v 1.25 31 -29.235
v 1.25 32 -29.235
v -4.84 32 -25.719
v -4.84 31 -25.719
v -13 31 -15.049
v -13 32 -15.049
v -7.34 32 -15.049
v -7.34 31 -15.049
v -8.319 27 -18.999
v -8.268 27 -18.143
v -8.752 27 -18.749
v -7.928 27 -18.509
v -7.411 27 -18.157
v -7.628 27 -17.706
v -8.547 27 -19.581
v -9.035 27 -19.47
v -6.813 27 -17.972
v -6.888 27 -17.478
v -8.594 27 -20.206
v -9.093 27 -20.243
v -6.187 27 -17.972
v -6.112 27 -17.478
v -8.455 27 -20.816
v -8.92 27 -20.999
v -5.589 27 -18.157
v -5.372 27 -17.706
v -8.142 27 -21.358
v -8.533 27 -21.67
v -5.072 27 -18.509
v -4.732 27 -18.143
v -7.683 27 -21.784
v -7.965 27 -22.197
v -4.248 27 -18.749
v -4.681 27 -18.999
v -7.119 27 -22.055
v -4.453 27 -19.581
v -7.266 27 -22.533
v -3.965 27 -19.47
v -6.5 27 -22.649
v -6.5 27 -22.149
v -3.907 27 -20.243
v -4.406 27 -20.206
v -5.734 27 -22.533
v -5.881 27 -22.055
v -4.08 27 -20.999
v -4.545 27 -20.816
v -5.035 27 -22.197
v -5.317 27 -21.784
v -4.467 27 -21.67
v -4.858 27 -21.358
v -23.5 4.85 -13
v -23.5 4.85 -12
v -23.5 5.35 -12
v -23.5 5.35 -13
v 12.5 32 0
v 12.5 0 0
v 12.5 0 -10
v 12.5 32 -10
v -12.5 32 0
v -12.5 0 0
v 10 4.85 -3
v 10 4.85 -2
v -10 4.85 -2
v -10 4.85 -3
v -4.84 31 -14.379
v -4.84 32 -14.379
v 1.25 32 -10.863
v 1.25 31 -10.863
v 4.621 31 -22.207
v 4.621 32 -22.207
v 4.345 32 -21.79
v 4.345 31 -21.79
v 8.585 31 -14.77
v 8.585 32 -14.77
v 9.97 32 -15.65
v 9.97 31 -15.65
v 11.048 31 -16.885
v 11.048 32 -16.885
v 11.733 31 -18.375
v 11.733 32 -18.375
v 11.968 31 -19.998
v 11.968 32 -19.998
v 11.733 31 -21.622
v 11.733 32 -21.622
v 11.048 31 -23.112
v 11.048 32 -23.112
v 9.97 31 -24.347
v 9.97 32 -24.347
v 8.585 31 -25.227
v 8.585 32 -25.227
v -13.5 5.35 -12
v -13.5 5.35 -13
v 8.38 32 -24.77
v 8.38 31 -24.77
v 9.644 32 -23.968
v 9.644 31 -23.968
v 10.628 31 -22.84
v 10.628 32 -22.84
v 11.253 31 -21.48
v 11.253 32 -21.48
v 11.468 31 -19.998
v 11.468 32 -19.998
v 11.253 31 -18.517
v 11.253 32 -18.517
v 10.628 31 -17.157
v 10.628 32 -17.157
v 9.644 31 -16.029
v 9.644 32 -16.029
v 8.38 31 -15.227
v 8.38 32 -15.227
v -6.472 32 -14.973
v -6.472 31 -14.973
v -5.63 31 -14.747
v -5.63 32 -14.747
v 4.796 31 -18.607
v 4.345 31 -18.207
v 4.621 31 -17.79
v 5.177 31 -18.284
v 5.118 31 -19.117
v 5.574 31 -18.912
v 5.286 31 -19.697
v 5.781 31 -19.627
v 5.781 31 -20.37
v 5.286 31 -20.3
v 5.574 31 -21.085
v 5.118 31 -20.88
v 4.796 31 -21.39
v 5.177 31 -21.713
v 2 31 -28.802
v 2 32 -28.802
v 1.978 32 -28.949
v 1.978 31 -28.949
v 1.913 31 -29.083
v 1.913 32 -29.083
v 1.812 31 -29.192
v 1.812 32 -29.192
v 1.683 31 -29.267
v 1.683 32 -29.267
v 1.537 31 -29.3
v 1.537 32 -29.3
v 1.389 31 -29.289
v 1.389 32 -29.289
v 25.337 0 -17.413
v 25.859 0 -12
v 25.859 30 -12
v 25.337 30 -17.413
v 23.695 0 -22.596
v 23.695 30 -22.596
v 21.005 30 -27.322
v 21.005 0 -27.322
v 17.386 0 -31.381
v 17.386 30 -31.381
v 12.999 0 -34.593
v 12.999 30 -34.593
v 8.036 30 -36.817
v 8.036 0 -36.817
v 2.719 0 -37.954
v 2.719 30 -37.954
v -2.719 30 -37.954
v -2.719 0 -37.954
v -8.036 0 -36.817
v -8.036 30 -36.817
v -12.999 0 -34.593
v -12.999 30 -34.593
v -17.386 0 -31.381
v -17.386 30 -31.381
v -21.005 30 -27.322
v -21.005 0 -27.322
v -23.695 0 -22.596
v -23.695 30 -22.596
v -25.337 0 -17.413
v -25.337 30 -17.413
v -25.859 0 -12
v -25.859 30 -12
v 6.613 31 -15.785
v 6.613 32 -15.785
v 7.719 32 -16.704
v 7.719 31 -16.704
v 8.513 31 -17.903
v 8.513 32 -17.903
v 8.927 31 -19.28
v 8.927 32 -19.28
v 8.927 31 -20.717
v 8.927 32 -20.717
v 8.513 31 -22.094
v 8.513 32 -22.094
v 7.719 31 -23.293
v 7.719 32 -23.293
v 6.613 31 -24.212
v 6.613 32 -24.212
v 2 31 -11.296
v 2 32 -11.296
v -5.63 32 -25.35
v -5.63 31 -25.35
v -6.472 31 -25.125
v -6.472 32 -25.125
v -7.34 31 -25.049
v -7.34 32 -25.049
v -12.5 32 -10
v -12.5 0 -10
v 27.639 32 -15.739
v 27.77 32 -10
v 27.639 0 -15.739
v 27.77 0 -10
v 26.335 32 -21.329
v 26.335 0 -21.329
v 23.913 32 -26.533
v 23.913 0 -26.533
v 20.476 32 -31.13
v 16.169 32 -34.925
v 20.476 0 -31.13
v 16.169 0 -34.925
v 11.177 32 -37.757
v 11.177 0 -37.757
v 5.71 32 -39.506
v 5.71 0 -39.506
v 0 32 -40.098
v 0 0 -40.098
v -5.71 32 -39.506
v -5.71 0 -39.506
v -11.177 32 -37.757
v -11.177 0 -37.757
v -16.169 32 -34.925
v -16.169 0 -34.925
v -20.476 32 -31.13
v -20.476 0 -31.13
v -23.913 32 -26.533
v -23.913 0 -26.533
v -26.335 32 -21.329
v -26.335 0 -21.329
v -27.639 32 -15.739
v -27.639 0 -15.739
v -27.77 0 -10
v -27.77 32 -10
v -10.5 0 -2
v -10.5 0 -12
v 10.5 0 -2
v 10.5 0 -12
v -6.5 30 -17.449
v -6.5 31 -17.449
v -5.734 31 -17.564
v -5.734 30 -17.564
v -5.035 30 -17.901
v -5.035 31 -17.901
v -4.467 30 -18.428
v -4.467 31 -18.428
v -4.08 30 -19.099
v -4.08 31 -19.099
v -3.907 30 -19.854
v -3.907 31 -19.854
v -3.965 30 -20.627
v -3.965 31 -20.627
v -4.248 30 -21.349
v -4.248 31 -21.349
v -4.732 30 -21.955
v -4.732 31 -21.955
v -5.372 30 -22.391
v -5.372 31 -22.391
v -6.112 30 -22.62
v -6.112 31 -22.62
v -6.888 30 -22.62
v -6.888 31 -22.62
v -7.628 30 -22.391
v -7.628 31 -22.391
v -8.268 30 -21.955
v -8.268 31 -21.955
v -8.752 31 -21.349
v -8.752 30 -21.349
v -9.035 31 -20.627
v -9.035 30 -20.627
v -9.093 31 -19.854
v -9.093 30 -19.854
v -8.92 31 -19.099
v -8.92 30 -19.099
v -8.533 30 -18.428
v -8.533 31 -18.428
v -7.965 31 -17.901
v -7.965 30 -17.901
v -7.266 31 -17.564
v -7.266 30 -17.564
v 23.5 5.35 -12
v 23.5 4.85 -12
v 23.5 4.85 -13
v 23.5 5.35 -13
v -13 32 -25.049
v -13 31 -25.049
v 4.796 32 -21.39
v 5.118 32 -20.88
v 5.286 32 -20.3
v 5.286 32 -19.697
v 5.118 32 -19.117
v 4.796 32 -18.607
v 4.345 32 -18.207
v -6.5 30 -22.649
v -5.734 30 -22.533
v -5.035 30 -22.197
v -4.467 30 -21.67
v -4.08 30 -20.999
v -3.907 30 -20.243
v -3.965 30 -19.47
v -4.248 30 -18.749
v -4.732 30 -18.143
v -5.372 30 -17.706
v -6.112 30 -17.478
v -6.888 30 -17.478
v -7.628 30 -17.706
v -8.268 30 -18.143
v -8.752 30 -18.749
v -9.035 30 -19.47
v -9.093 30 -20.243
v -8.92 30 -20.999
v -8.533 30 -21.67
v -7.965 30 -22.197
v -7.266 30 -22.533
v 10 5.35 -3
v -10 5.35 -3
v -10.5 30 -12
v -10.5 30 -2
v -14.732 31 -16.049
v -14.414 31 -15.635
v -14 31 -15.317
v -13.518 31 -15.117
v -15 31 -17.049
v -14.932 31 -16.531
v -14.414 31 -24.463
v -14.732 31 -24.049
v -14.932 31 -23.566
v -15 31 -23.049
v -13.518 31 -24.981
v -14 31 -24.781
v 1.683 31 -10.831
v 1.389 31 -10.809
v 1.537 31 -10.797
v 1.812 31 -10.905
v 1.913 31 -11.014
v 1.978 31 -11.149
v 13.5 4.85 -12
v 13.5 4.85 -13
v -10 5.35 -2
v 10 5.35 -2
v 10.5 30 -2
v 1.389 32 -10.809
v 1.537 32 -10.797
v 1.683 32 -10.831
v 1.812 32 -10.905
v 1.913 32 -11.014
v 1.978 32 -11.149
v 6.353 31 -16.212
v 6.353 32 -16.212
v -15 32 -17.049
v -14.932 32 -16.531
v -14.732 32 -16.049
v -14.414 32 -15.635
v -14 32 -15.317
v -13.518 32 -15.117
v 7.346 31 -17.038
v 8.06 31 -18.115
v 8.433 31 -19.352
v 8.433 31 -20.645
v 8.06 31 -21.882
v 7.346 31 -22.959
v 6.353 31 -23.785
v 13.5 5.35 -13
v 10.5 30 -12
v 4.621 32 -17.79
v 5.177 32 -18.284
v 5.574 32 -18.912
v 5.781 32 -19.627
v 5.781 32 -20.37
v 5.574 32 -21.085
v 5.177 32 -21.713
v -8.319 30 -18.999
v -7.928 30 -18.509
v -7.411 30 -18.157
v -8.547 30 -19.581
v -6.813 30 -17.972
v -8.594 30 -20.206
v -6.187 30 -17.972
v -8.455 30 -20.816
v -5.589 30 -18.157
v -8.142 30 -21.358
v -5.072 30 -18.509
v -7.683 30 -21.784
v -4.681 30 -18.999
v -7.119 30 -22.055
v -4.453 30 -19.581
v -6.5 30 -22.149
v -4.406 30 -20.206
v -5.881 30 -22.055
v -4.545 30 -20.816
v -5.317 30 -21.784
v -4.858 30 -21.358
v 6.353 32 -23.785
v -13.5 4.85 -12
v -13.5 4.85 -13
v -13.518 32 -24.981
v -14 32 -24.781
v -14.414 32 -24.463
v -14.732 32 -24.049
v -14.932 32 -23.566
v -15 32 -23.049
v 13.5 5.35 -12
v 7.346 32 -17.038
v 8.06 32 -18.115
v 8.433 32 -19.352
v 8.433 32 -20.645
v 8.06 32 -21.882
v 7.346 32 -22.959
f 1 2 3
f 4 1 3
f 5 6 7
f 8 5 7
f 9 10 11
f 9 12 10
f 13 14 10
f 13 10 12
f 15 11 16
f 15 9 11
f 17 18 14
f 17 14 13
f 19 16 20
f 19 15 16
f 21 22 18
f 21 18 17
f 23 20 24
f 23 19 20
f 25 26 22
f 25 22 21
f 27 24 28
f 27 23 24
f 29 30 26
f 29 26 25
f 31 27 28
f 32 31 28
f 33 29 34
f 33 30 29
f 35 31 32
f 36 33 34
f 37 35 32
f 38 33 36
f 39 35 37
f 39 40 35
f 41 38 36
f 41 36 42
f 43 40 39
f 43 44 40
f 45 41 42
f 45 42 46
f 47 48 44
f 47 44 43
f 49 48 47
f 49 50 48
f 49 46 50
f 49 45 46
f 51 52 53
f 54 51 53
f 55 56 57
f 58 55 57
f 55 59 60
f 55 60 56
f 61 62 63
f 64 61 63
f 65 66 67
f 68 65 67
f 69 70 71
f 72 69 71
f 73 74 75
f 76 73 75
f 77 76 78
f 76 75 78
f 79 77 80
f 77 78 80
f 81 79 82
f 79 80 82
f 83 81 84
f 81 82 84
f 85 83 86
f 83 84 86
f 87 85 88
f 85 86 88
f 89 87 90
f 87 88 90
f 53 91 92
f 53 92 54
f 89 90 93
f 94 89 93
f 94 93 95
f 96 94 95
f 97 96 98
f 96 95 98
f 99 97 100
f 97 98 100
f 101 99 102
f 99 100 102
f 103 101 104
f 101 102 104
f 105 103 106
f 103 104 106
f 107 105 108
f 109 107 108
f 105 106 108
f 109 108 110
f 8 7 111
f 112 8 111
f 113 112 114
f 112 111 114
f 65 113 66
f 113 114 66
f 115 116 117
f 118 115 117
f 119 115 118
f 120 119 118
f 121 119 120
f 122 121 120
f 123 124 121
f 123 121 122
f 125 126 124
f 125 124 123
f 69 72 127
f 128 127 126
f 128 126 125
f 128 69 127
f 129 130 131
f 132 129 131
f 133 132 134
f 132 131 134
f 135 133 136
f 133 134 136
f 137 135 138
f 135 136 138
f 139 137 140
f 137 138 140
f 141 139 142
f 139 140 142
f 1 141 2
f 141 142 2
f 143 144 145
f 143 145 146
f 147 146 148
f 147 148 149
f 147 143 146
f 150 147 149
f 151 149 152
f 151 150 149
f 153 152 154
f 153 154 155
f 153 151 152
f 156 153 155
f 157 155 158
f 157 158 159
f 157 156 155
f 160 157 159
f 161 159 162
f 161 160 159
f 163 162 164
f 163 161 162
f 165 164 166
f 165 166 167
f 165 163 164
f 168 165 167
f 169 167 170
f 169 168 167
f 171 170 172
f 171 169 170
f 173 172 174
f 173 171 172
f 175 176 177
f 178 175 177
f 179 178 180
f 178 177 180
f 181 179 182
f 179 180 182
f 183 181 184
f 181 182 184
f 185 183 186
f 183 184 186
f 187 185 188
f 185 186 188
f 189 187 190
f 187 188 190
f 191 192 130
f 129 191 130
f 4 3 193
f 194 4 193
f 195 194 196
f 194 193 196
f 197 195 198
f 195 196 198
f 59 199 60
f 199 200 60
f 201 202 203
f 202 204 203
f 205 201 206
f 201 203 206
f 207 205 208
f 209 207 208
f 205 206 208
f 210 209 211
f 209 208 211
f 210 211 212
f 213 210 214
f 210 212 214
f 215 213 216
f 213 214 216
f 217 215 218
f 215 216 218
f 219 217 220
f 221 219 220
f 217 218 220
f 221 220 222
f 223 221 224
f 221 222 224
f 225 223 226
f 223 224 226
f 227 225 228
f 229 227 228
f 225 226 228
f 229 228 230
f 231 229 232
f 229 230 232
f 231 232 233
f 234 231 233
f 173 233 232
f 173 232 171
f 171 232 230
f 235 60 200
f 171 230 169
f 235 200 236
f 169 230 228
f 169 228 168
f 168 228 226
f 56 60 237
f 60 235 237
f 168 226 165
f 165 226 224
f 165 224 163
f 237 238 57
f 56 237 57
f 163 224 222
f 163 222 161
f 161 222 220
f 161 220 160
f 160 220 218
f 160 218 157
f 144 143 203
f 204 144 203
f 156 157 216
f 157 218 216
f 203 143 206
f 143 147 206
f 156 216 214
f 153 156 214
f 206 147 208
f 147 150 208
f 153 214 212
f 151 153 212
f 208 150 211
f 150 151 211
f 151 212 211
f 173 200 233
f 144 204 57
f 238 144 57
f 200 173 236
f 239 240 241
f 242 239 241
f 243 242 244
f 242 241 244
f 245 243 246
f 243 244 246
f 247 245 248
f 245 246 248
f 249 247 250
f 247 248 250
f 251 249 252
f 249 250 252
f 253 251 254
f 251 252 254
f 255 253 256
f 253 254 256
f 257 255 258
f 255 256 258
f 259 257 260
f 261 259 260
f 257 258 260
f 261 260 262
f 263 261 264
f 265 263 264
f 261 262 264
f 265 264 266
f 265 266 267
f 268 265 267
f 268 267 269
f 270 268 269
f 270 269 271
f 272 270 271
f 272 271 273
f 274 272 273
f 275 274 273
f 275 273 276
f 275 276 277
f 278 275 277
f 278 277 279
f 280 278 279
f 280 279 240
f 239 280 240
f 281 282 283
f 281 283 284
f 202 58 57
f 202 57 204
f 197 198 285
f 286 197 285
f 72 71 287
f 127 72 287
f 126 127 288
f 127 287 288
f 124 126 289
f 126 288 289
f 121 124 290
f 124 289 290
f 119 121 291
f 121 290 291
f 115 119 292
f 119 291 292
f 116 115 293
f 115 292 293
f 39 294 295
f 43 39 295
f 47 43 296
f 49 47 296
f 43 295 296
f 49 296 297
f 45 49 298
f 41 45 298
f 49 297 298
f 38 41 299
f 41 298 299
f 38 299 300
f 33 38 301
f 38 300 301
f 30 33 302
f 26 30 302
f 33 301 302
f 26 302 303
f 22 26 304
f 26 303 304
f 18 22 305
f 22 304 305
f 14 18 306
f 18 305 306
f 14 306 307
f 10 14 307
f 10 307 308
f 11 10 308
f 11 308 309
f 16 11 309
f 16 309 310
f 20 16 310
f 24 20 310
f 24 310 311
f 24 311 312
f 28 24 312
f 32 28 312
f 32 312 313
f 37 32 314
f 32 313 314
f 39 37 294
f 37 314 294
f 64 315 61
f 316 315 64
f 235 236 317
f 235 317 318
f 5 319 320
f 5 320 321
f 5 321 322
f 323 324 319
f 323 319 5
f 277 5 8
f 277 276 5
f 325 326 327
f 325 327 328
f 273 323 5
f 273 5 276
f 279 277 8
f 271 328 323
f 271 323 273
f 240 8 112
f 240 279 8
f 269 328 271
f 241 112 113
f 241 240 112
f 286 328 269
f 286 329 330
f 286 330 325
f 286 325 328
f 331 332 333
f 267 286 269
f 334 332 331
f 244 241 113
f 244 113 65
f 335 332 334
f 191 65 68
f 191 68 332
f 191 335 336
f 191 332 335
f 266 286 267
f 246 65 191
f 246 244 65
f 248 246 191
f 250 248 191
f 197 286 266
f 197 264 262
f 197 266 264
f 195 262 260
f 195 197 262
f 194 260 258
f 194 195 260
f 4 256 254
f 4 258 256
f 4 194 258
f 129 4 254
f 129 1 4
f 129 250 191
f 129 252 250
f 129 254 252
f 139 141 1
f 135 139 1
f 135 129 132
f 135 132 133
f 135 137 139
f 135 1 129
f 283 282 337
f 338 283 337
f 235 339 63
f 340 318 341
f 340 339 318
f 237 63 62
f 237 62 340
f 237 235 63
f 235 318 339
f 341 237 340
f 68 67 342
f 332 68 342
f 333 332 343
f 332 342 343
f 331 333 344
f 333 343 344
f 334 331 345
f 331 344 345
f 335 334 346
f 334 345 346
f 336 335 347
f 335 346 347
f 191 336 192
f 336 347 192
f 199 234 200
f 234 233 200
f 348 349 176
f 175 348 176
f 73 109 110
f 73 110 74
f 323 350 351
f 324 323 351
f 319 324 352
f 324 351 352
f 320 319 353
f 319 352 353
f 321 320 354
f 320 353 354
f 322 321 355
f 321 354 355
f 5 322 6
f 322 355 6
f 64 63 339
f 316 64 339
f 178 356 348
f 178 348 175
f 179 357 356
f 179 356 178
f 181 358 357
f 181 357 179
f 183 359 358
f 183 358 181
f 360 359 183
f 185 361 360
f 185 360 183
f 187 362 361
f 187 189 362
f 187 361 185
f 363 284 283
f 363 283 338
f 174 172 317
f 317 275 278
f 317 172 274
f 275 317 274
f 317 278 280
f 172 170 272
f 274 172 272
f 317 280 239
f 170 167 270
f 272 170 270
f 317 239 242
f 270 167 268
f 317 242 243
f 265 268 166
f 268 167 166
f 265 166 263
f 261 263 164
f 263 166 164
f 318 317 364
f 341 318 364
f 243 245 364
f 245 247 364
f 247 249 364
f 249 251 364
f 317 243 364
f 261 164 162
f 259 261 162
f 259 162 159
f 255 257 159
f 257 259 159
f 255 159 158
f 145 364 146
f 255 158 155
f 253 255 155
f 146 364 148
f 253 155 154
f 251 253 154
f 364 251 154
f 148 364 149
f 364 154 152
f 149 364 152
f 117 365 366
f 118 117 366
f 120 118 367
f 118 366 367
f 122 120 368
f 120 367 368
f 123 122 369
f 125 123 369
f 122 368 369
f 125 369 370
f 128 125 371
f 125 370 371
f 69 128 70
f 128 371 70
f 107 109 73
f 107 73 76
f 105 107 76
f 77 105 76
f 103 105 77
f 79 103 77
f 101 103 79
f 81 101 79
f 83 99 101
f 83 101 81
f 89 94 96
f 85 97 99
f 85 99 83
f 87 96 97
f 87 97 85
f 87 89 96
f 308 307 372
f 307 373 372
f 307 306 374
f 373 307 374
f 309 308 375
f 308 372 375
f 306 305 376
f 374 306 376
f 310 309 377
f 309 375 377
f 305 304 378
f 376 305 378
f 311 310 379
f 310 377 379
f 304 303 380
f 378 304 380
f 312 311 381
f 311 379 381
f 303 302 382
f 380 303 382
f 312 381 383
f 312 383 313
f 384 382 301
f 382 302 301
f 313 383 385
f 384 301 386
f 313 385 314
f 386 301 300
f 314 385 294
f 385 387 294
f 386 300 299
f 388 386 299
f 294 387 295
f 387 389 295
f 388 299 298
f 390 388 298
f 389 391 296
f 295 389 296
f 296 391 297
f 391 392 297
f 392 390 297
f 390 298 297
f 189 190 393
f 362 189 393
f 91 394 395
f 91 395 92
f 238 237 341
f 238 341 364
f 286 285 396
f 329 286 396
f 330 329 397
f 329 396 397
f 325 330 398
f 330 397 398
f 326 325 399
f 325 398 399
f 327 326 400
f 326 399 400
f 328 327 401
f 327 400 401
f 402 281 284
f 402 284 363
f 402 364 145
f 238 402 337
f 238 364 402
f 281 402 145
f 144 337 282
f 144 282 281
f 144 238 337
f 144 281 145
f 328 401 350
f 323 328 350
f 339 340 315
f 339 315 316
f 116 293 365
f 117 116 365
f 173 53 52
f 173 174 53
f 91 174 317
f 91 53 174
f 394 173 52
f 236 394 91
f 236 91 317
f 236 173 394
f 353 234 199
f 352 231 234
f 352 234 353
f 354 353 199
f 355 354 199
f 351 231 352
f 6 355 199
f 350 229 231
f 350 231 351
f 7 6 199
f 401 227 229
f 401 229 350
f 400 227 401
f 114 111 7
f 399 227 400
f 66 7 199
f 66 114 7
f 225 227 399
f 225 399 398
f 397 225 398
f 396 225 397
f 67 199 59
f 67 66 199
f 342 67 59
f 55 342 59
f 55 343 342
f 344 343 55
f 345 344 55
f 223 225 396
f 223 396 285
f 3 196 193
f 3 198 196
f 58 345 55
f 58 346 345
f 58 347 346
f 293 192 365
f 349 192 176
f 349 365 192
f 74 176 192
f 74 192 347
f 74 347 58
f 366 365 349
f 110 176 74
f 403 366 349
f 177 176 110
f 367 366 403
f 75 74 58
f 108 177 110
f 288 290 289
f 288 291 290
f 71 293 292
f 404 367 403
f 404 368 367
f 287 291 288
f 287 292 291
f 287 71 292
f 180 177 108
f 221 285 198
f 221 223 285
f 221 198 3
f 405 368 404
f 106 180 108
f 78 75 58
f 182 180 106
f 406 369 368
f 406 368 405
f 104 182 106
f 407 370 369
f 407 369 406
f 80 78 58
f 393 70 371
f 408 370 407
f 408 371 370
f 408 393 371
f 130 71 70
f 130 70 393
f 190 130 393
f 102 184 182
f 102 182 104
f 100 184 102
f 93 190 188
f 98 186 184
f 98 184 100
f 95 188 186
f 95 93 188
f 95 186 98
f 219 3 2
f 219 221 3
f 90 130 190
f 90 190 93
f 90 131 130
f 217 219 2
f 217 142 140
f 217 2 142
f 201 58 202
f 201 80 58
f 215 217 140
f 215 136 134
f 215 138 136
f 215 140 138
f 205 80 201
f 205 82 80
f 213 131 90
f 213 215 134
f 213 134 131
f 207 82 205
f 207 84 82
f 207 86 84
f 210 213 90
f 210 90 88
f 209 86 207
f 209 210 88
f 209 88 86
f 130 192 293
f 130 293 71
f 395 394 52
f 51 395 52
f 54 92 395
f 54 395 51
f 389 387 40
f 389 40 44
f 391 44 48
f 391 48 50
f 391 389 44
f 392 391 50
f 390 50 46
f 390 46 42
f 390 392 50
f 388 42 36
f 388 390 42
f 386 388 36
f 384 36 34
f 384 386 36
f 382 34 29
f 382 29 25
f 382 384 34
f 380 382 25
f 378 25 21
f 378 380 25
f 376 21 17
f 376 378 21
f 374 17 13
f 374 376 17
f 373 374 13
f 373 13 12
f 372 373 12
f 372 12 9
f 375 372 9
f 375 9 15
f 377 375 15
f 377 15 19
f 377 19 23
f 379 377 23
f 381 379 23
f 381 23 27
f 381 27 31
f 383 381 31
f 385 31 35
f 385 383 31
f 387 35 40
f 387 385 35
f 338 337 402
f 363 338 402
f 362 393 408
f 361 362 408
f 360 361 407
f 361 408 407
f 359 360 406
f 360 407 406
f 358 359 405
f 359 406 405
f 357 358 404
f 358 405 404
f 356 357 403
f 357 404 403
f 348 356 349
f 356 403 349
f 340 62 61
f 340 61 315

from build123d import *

# Parameters (mm, degrees)
EXTRUIR_L_MINA1_DEPTH        = 30
SALIENTE_EXTRUIR1_DEPTH      = 2
CORTAR_EXTRUIR1_DEPTH        = 1
CORTAR_EXTRUIR_L_MINA2_DEPTH = 1
CROQUIS5_W                   = 20
CROQUIS5_H                   = 0.5
EXTRUIR_L_MINA2_DEPTH        = 1
CROQUIS6_W                   = 10
CROQUIS6_H                   = 0.5
EXTRUIR_L_MINA3_DEPTH        = 1
CROQUIS7_R                   = 2.6
CORTAR_EXTRUIR2_DEPTH        = 11
CROQUIS8_R                   = 2.6
CROQUIS8_R_2                 = 2.1
SALIENTE_EXTRUIR2_DEPTH      = 3


with BuildPart() as part:
    # Croquis1 → Extruir-Lámina1 (new body)
    with BuildSketch(Plane(origin=(0, 0, 0), x_dir=(1, 0, 0), z_dir=(0, 1, 0))):
        with BuildLine():
            Line((-27.77, 10), (-12.5, 10))
            Line((-12.5, 10), (-12.5, 0))
            Line((-12.5, 0), (12.5, 0))
            Line((12.5, 0), (12.5, 10))
            Line((12.5, 10), (27.77, 10))
            ThreePointArc((27.77, 10), (0, 40.097565641), (-27.77, 10))
        make_face()
        with BuildLine():
            Line((-25.858908766, 12), (-10.5, 12))
            Line((-10.5, 12), (-10.5, 2))
            Line((-10.5, 2), (10.5, 2))
            Line((10.5, 2), (10.5, 12))
            Line((10.5, 12), (25.858908766, 12))
            ThreePointArc((25.858908766, 12), (0, 38.097565641), (-25.858908766, 12))
        make_face(mode=Mode.SUBTRACT)
    extrude(amount=EXTRUIR_L_MINA1_DEPTH)

    # Croquis2 → Saliente-Extruir1 (add)
    with BuildSketch(Plane(origin=(0, 30, 0), x_dir=(1, 0, 0), z_dir=(0, 1, 0))):
        with BuildLine():
            Line((12.5, 10), (27.77, 10))
            ThreePointArc((27.77, 10), (0, 40.097565641), (-27.77, 10))
            Line((-27.77, 10), (-12.5, 10))
            Line((-12.5, 10), (-12.5, 0))
            Line((-12.5, 0), (12.5, 0))
            Line((12.5, 0), (12.5, 10))
        make_face()
    extrude(amount=SALIENTE_EXTRUIR1_DEPTH)

    # Croquis3 → Cortar-Extruir1 (cut)
    with BuildSketch(Plane(origin=(0, 32, 0), x_dir=(1, 0, 0), z_dir=(0, 1, 0))):
        with BuildLine():
            Line((-15, 23.048782821), (-15, 17.048782821))
            ThreePointArc((-15, 17.048782821), (-14.414213562, 15.634569258), (-13, 15.048782821))
            Line((-13, 15.048782821), (-7.339745962, 15.048782821))
            ThreePointArc((-7.339745962, 15.048782821), (-6.045650737, 14.878411952), (-4.839745962, 14.37890984))
            Line((-4.839745962, 14.37890984), (1.25, 10.862993369))
            ThreePointArc((1.25, 10.862993369), (1.75, 10.862993369), (2, 11.296006071))
            Line((2, 11.296006071), (2, 28.80155957))
            ThreePointArc((2, 28.80155957), (1.75, 29.234572272), (1.25, 29.234572272))
            Line((1.25, 29.234572272), (-4.839745962, 25.718655802))
            ThreePointArc((-4.839745962, 25.718655802), (-6.045650737, 25.219153689), (-7.339745962, 25.048782821))
            Line((-7.339745962, 25.048782821), (-13, 25.048782821))
            ThreePointArc((-13, 25.048782821), (-14.414213562, 24.462996383), (-15, 23.048782821))
        make_face()
    extrude(amount=-CORTAR_EXTRUIR1_DEPTH, mode=Mode.SUBTRACT)

    # Croquis4 → Cortar-Extruir-Lámina2 (cut)
    with BuildSketch(Plane(origin=(0, 32, 0), x_dir=(1, 0, 0), z_dir=(0, 1, 0))):
        with BuildLine():
            ThreePointArc((4.344585076, 21.79004299), (5.307052977, 19.99849463), (4.344585076, 18.206946269))
            Line((4.344585076, 18.206946269), (4.620613436, 17.79004299))
            ThreePointArc((4.620613436, 17.79004299), (5.807052977, 19.99849463), (4.620613436, 22.206946269))
            Line((4.620613436, 22.206946269), (4.344585076, 21.79004299))
        make_face()
        with BuildLine():
            ThreePointArc((6.352562942, 23.784975176), (8.479957679, 19.99849463), (6.352562942, 16.212014083))
            Line((6.352562942, 16.212014083), (6.612635571, 15.784975176))
            ThreePointArc((6.612635571, 15.784975176), (8.979957679, 19.99849463), (6.612635571, 24.212014083))
            Line((6.612635571, 24.212014083), (6.352562942, 23.784975176))
        make_face()
        with BuildLine():
            ThreePointArc((8.380144543, 24.770452897), (11.467649375, 19.99849463), (8.380144543, 15.226536362))
            Line((8.380144543, 15.226536362), (8.58505397, 14.770452897))
            ThreePointArc((8.58505397, 14.770452897), (11.967649375, 19.99849463), (8.58505397, 25.226536362))
            Line((8.58505397, 25.226536362), (8.380144543, 24.770452897))
        make_face()
    extrude(amount=-CORTAR_EXTRUIR_L_MINA2_DEPTH, mode=Mode.SUBTRACT)

    # Croquis5 → Extruir-Lámina2 (add)
    with BuildSketch(Plane(origin=(0, 0, -2), x_dir=(-1, 0, 0), z_dir=(0, 0, -1))):
        with Locations((0, 5.1)):
            Rectangle(CROQUIS5_W, CROQUIS5_H)
    extrude(amount=EXTRUIR_L_MINA2_DEPTH)

    # Croquis6 → Extruir-Lámina3 (add)
    with BuildSketch(Plane(origin=(0, 0, -12), x_dir=(-1, 0, 0), z_dir=(0, 0, -1))):
        with Locations((-18.5, 5.1)):
            Rectangle(CROQUIS6_W, CROQUIS6_H)
        with Locations((18.5, 5.1)):
            Rectangle(CROQUIS6_W, CROQUIS6_H)
    extrude(amount=EXTRUIR_L_MINA3_DEPTH)

    # Croquis7 → Cortar-Extruir2 (cut)
    with BuildSketch(Plane(origin=(0, 32, 0), x_dir=(1, 0, 0), z_dir=(0, 1, 0))):
        with Locations(Location((-6.5, 20.048782821, 0), (0, 0, 270))):
            Circle(CROQUIS7_R)
    extrude(amount=-CORTAR_EXTRUIR2_DEPTH, mode=Mode.SUBTRACT)


with BuildPart() as body_2:
    # Croquis8 → Saliente-Extruir2 (new body)
    with BuildSketch(Plane.XZ.offset(-30)):
        with Locations(Location((-6.5, -20.048782821, 0), (0, 0, 270))):
            Circle(CROQUIS8_R)
        with Locations(Location((-6.5, -20.048782821, 0), (0, 0, 270))):
            Circle(CROQUIS8_R_2, mode=Mode.SUBTRACT)
    extrude(amount=SALIENTE_EXTRUIR2_DEPTH)


solid = Compound([part.part, body_2.part])
